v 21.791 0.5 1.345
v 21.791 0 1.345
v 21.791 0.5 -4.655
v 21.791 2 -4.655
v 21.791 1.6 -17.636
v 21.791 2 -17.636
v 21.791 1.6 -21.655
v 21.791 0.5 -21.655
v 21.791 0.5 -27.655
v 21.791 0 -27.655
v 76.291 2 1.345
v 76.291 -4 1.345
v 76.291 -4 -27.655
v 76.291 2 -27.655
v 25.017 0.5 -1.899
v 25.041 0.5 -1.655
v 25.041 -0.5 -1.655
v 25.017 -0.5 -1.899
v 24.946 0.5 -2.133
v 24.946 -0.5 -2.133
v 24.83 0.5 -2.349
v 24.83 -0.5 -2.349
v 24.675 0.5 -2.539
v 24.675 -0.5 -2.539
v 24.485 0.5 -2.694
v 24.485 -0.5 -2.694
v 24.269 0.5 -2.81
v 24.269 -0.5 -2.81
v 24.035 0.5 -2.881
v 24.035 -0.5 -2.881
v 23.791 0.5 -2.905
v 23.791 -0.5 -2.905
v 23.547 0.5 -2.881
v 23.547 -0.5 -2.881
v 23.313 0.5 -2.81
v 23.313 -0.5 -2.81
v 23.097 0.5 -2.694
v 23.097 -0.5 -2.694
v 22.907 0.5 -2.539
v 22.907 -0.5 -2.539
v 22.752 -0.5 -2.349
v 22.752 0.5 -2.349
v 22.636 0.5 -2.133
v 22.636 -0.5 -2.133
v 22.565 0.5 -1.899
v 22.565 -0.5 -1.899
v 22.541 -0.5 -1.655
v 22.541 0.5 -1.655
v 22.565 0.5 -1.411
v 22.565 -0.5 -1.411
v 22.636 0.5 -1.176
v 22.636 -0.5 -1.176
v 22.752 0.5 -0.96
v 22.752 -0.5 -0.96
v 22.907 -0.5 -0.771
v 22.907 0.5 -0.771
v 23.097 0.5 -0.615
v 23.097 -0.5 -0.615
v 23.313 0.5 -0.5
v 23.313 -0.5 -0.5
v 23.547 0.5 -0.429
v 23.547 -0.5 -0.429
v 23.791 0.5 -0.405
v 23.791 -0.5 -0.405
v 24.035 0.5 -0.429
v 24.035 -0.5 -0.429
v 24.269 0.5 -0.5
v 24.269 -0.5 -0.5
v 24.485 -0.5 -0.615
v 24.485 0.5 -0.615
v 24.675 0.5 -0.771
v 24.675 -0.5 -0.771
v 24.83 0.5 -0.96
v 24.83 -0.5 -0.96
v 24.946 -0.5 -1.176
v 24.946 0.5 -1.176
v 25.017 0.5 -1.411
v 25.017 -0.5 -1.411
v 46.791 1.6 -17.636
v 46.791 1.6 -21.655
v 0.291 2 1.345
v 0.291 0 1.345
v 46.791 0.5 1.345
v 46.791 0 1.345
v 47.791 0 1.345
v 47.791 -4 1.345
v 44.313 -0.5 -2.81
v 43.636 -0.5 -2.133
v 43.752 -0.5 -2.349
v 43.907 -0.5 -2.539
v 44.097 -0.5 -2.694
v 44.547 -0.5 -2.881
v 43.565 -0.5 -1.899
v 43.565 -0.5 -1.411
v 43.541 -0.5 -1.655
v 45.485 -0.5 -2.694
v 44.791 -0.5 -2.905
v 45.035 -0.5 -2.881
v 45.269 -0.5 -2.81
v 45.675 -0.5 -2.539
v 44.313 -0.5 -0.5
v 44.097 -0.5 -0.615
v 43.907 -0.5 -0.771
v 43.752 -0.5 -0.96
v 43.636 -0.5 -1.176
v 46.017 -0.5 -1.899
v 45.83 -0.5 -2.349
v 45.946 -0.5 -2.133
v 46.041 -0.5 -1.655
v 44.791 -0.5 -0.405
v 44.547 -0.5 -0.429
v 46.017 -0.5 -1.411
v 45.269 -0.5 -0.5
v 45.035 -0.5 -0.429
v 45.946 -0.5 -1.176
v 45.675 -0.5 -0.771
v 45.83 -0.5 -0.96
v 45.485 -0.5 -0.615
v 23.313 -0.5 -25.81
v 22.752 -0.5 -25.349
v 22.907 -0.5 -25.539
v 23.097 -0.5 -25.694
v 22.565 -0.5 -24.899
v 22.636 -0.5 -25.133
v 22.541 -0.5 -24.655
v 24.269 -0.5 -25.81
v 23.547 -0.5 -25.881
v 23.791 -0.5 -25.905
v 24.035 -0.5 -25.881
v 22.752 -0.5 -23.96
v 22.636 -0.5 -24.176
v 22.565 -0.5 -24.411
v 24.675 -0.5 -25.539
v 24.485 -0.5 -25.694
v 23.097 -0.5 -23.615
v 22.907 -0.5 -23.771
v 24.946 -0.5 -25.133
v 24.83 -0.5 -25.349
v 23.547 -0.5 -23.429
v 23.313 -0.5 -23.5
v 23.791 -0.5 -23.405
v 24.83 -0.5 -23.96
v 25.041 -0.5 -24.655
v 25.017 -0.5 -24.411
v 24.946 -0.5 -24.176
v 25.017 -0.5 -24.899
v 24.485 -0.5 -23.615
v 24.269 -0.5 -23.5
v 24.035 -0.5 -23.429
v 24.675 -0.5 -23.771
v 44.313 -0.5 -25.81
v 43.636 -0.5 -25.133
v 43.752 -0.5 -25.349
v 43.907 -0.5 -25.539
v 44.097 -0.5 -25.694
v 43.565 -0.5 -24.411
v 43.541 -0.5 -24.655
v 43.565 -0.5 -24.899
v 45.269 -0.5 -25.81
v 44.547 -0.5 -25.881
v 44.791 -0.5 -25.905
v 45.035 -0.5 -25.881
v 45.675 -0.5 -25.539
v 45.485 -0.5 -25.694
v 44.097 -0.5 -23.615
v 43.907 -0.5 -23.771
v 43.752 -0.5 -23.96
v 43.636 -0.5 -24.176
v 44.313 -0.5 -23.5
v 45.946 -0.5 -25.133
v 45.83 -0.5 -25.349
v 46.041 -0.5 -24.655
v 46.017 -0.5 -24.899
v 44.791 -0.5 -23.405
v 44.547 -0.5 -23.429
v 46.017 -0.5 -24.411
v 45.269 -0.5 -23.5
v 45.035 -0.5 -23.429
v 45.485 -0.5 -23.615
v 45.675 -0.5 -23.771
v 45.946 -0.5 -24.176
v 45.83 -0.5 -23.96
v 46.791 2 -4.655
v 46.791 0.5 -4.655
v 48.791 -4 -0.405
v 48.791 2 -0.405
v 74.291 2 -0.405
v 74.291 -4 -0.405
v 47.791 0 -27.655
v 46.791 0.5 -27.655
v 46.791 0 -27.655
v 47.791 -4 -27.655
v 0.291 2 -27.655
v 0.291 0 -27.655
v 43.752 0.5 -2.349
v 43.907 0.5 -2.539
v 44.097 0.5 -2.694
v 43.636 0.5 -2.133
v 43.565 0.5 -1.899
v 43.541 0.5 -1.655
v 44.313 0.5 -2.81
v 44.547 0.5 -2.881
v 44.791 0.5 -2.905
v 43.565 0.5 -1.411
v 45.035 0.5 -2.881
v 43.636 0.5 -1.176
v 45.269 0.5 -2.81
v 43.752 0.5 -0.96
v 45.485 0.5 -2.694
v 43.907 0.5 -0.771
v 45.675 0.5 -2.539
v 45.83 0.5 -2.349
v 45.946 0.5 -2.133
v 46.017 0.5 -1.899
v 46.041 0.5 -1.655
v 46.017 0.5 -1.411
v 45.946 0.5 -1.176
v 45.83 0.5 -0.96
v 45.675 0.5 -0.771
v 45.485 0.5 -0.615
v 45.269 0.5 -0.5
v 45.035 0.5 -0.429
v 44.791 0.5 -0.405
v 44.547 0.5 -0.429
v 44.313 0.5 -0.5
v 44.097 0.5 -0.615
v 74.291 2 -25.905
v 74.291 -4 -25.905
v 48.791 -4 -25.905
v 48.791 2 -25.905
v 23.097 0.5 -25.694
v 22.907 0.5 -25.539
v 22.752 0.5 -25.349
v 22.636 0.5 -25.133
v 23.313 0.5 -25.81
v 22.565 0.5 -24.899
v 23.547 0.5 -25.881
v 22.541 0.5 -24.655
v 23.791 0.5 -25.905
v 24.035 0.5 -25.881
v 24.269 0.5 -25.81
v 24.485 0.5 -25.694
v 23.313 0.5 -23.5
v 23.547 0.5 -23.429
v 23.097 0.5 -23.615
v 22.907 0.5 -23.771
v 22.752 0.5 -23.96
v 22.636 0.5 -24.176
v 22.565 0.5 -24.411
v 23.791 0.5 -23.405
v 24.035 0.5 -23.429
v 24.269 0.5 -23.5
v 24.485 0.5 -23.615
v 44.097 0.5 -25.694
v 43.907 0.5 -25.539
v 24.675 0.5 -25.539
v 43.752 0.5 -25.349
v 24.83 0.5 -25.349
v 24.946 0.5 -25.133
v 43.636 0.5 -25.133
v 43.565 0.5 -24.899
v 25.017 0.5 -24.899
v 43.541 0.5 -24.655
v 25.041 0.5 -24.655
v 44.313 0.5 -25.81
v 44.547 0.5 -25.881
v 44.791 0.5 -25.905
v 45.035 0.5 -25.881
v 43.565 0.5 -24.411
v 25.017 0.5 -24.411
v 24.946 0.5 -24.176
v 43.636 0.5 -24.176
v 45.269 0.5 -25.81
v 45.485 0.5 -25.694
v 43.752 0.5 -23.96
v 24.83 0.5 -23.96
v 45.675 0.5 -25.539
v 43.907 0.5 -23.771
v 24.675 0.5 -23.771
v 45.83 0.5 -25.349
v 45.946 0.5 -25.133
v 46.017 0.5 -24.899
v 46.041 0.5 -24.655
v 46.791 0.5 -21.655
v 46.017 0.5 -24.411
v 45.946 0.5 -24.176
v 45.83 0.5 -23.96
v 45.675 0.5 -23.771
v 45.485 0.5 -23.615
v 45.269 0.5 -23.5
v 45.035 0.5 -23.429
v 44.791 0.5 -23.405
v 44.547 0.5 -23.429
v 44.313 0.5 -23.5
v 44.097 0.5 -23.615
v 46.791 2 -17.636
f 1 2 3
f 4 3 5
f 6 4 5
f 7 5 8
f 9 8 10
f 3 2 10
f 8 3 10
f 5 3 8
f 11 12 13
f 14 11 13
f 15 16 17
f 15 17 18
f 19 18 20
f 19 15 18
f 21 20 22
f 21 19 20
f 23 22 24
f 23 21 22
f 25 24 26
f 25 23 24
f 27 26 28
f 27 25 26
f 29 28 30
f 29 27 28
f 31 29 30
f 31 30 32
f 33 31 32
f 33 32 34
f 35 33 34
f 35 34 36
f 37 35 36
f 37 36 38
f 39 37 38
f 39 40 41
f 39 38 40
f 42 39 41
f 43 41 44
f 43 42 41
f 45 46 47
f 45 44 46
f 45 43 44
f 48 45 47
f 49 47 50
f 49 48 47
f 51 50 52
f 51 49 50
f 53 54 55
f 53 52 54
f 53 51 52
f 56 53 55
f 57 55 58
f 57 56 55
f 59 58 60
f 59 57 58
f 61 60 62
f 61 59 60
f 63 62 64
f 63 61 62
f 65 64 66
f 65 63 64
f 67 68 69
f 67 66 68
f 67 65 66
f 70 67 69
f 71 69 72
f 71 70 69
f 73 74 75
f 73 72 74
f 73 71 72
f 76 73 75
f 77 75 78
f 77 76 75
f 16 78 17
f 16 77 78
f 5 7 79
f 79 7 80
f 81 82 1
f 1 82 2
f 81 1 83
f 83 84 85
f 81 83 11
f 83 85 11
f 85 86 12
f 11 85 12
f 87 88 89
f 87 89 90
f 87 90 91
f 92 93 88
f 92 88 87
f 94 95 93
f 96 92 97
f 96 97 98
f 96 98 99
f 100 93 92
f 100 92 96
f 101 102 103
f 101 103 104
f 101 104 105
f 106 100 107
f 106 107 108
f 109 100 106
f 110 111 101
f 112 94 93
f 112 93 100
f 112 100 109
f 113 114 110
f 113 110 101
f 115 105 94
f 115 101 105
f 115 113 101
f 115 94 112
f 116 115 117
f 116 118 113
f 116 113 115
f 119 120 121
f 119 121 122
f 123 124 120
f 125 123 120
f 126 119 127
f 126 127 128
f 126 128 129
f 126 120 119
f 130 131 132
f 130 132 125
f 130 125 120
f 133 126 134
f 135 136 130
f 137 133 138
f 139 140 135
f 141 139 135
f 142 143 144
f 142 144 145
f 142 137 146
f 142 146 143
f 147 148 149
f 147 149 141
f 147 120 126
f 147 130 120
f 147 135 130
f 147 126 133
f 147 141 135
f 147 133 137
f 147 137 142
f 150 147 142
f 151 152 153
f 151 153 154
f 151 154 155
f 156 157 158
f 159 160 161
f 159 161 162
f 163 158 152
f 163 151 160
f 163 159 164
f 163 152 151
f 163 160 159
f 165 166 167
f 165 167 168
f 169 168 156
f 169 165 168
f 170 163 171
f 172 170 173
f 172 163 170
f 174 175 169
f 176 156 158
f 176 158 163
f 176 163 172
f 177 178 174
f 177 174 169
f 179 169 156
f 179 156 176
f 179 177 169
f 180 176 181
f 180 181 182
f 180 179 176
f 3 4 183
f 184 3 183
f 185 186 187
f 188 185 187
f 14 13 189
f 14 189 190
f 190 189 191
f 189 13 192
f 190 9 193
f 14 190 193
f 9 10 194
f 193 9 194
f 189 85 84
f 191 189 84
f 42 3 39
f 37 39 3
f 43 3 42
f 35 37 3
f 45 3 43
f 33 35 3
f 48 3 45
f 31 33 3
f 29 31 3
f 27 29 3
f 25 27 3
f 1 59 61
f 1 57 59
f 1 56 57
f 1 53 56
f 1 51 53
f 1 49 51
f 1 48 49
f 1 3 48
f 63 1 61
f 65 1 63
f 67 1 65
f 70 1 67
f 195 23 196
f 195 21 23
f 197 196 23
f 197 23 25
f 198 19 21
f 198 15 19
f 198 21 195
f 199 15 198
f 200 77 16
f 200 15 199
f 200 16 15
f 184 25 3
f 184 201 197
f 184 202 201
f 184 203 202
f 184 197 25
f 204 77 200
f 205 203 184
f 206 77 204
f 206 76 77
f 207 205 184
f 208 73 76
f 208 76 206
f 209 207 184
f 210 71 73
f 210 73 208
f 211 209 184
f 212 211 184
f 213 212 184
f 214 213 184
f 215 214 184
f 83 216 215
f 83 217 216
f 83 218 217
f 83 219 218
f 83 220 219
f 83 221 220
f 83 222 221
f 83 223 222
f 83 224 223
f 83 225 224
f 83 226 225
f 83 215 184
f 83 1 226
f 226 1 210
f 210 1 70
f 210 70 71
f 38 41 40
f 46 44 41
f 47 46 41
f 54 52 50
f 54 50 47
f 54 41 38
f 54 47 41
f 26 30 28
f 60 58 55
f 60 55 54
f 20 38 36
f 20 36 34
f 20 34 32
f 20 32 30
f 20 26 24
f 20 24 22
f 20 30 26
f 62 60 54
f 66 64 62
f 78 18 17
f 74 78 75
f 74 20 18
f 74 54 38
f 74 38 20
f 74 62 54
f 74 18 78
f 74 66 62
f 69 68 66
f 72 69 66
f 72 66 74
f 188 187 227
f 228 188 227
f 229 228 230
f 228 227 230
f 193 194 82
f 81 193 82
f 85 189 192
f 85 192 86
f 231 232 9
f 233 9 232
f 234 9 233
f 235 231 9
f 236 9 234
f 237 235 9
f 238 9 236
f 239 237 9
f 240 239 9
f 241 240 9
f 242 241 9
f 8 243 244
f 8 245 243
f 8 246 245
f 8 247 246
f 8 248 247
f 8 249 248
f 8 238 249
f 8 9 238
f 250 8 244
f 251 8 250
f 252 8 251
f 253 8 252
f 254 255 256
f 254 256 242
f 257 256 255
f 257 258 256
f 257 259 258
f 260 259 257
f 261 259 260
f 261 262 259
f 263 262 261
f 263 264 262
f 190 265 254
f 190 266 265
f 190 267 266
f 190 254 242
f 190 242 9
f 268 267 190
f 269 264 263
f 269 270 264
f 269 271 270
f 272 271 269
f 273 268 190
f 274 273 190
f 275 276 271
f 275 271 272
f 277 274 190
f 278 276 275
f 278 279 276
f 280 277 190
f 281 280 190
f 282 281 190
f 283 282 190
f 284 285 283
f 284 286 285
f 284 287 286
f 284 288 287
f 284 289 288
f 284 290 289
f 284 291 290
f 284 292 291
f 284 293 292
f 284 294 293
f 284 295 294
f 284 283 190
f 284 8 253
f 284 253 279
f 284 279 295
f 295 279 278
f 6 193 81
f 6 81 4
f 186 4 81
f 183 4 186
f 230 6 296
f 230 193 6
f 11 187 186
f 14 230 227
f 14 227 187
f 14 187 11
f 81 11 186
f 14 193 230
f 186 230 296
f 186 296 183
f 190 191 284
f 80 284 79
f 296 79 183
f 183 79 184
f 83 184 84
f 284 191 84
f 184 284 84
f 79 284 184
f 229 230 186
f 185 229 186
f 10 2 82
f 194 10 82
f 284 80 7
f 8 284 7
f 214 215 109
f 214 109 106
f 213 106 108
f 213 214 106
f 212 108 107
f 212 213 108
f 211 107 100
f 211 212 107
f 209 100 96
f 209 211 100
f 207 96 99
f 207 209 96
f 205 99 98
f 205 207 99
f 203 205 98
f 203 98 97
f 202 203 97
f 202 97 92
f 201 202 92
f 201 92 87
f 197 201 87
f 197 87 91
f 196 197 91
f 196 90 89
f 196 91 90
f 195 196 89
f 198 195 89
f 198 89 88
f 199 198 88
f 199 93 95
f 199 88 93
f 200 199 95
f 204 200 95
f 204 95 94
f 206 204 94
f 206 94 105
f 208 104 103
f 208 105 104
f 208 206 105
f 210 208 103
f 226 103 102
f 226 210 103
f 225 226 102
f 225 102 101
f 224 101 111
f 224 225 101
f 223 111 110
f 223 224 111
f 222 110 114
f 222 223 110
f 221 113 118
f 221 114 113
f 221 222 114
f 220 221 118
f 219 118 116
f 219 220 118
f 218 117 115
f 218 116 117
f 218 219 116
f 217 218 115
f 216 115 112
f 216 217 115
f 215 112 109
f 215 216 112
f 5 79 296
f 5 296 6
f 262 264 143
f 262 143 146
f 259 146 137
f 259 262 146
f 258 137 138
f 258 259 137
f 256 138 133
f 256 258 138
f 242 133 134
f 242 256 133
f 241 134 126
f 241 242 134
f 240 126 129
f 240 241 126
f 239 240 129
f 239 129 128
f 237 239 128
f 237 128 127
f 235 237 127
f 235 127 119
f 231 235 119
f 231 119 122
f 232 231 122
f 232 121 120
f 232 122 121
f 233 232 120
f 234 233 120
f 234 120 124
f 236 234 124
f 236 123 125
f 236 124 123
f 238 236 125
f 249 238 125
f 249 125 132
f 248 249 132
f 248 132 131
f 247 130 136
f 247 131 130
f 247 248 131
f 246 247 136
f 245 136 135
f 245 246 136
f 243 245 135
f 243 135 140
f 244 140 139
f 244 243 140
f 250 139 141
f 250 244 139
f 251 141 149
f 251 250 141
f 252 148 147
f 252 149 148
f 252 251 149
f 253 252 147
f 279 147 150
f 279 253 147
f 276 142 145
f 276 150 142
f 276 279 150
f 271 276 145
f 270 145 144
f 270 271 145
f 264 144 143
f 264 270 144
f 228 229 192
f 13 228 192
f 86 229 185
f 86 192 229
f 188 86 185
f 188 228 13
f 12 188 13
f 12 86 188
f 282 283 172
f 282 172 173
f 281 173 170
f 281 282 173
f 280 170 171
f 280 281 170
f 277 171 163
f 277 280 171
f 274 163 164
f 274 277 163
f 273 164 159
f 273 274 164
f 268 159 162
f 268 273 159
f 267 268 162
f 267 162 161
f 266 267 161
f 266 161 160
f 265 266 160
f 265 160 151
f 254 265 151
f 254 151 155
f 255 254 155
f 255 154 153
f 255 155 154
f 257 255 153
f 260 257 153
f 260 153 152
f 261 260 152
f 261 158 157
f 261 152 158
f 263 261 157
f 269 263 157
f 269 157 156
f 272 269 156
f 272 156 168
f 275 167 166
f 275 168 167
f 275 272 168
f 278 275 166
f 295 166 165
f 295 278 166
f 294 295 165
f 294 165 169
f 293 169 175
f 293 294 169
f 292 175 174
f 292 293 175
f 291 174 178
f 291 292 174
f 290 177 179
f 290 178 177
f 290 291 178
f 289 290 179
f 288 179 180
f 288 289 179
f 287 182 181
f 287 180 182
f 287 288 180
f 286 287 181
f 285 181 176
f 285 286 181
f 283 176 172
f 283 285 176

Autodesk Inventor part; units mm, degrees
ref_plane "YZ Plane" through (0, 0, 0) normal (1, 0, 0) x (0, 1, 0)
ref_plane "XZ Plane" through (0, 0, 0) normal (0, 1, 0) x (-1, 0, 0)
ref_plane "XY Plane" through (0, 0, 0) normal (0, 0, 1) x (1, 0, 0)
sketch "Sketch1" plane through (0, 0, 0) normal (0, 1, 0) x (-1, 0, 0)
  line L0 (-0.291, 1.3452) -> (-76.291, 1.3452)
  line L1 (-76.291, 1.3452) -> (-76.291, -27.6548)
  line L2 (-76.291, -27.6548) -> (-0.291, -27.6548)
  line L3 (-0.291, -27.6548) -> (-0.291, 1.3452)
  point P0 (0, 0)
  dimension "d0" = 76
  dimension "d1" = 29
extrude "Extrusion1" add sketch "Sketch1" along normal blind 2
sketch "Sketch2" plane through (0, 2, 0) normal (0, 1, 0) x (1, 0, 0)
  line L0 (21.791, 4.6548) -> (46.791, 4.6548)
  line L1 (46.791, 4.6548) -> (46.791, 21.6548)
  line L2 (46.791, 21.6548) -> (21.791, 21.6548)
  line L3 (21.791, 21.6548) -> (21.791, 4.6548)
  line L4 (0.291, 27.6548) -> (0.291, -1.3452) projected
  line L5 (76.291, -1.3452) -> (76.291, 27.6548) projected
  line L6 (76.291, 27.6548) -> (0.291, 27.6548) projected
  point P0 (0, 0)
  point P1 (21.791, 13.1548)
  dimension "d4" = 25
  dimension "d5" = 17
  dimension "d10" = 29.5
  dimension "d18" = 6
extrude "Extrusion2" cut sketch "Sketch2" against normal blind 2
sketch "Sketch3" plane through (0, 2, 0) normal (0, 1, 0) x (1, 0, 0)
  line L0 (48.791, 0.4048) -> (74.291, 0.4048)
  line L1 (74.291, 0.4048) -> (74.291, 25.9048)
  line L2 (74.291, 25.9048) -> (48.791, 25.9048)
  line L3 (48.791, 25.9048) -> (48.791, 0.4048)
  line L4 (76.291, -1.3452) -> (76.291, 27.6548) projected
  line L5 (46.791, 21.6548) -> (46.791, 4.6548) projected
  point P0 (0, 0)
  point P1 (74.291, 13.1548)
  point P2 (76.291, 13.1548)
  dimension "d8" = 25.5
  dimension "d27" = 2
extrude "Extrusion3" cut sketch "Sketch3" against normal blind 2
sketch "Sketch4" plane through (0, 0, 0) normal (0, -1, 0) x (1, 0, 0)
  line L0 (74.291, -25.9048) -> (48.791, -25.9048) projected
  line L1 (48.791, -25.9048) -> (48.791, -0.4048) projected
  line L2 (48.791, -0.4048) -> (74.291, -0.4048) projected
  line L3 (74.291, -0.4048) -> (74.291, -25.9048) projected
  line L4 (46.791, -21.6548) -> (21.791, -21.6548) projected
  line L5 (21.791, -21.6548) -> (21.791, -4.6548) projected
  line L6 (21.791, -4.6548) -> (46.791, -4.6548) projected
  line L7 (46.791, -4.6548) -> (46.791, -21.6548) projected
  line L8 (76.291, 1.3452) -> (76.291, -27.6548) projected
  line L9 (0.291, 1.3452) -> (76.291, 1.3452) projected
  line L10 (0.291, -27.6548) -> (0.291, 1.3452) projected
  line L11 (76.291, -27.6548) -> (0.291, -27.6548) projected
  line L12 (21.791, -27.6548) -> (46.791, -27.6548)
  line L13 (46.791, -27.6548) -> (46.791, 1.3452)
  line L14 (46.791, 1.3452) -> (21.791, 1.3452)
  line L15 (21.791, 1.3452) -> (21.791, -27.6548)
  point P0 (0, 0)
  point P1 (46.791, -21.6548)
  point P2 (21.791, 1.3452)
  point P3 (21.791, -4.6548)
  point P4 (46.791, -4.6548)
extrude "Extrusion4" cut sketch "Sketch4" against normal blind 0.5 contours L13 L11 L15 L4 | L6 L15 L9 L13
sketch "Sketch9" plane through (0, 2, 0) normal (0, 1, 0) x (1, 0, 0)
  line L0 (48.791, 25.9048) -> (74.291, 25.9048) projected
  line L1 (74.291, 25.9048) -> (74.291, 0.4048) projected
  line L2 (74.291, 0.4048) -> (48.791, 0.4048) projected
  line L3 (48.791, 0.4048) -> (48.791, 25.9048) projected
  line L4 (21.791, 21.6548) -> (46.791, 21.6548) projected
  line L5 (46.791, 21.6548) -> (46.791, 4.6548) projected
  line L6 (46.791, 4.6548) -> (21.791, 4.6548) projected
  line L7 (21.791, 4.6548) -> (21.791, 21.6548) projected
  line L8 (76.291, -1.3452) -> (76.291, 27.6548) projected
  line L9 (76.291, 27.6548) -> (0.291, 27.6548) projected
  line L10 (0.291, 27.6548) -> (0.291, -1.3452) projected
  line L11 (0.291, -1.3452) -> (76.291, -1.3452) projected
  line L12 (46.791, 15.6362) -> (21.791, 15.6362)
  line L13 (21.791, 21.6548) -> (46.791, 21.6548) projected
  line L14 (21.791, 4.6548) -> (21.791, 21.6548) projected
  line L15 (46.791, 21.6548) -> (46.791, 4.6548) projected
  point P0 (0, 0)
extrude "Extrusion9" add sketch "Sketch9" against normal blind 0.4 contours L4 L5 L12 L7
sketch "Sketch10" plane through (0, 0, 0) normal (0, -1, 0) x (1, 0, 0)
  line L0 (46.791, 1.3452) -> (46.791, -27.6548) projected
  line L1 (76.291, -27.6548) -> (46.791, -27.6548) projected
  line L2 (76.291, 1.3452) -> (76.291, -27.6548) projected
  line L3 (46.791, 1.3452) -> (76.291, 1.3452) projected
  line L4 (74.291, -25.9048) -> (48.791, -25.9048) projected
  line L5 (48.791, -25.9048) -> (48.791, -0.4048) projected
  line L6 (48.791, -0.4048) -> (74.291, -0.4048) projected
  line L7 (74.291, -0.4048) -> (74.291, -25.9048) projected
  line L8 (47.791, -26.9048) -> (75.291, -26.9048)
  line L9 (75.291, -26.9048) -> (75.291, 0.5952)
  line L10 (75.291, 0.5952) -> (47.791, 0.5952)
  line L11 (47.791, 0.5952) -> (47.791, -26.9048)
  line L12 (47.791, -26.9048) -> (47.791, -27.6548)
  line L13 (47.791, 0.5952) -> (47.791, 1.3452)
  point P0 (0, 0)
  dimension "d32" = 1
extrude "Extrusion10" add sketch "Sketch10" along normal blind 4 contours L3 L2 L1 L12 L8 L9 L10 L13 | L10 L9 L8 L11
sketch "Sketch13" plane through (0, 0.5, 0) normal (0, -1, 0) x (1, 0, 0)
  circle A0 centre (44.791, -1.6548) radius 1.25
  circle A1 centre (23.791, -1.6548) radius 1.25
  circle A2 centre (44.791, -24.6548) radius 1.25
  circle A3 centre (23.791, -24.6548) radius 1.25
  line L0 (44.791, -1.6548) -> (23.791, -1.6548) construction
  line L1 (46.791, -4.6548) -> (21.791, -4.6548) construction
  point P0 (0, 0)
  point P1 (51.5193, 88.3762)
  point P2 (34.291, -1.6548)
  point P3 (34.291, -4.6548)
  point P4 (21.791, 1.3452)
  dimension "d44" = 2.5
  dimension "d45" = 2.5
  dimension "d46" = 2.5
  dimension "d47" = 2.5
  dimension "d48" = 23
  dimension "d49" = 21
  dimension "d50" = 3
extrude "Extrusion13" add sketch "Sketch13" along normal blind 1
sketch "Sketch14" plane through (0, 1.6, 0) normal (0, -1, 0) x (1, 0, 0)
  line L0 (46.791, -15.6362) -> (46.791, -21.6548) projected
  line L1 (46.791, -15.6362) -> (21.791, -15.6362) projected
  line L2 (21.791, -21.6548) -> (21.791, -15.6362) projected
  line L3 (46.791, -21.6548) -> (21.791, -21.6548) projected
  line L4 (46.791, -17.6362) -> (21.791, -17.6362)
  point P0 (0, 0)
  dimension "d53" = 2
extrude "Extrusion14" cut sketch "Sketch14" against normal blind 1 contours L0 L4 L2 L1
properties part number "pokrywka2"
